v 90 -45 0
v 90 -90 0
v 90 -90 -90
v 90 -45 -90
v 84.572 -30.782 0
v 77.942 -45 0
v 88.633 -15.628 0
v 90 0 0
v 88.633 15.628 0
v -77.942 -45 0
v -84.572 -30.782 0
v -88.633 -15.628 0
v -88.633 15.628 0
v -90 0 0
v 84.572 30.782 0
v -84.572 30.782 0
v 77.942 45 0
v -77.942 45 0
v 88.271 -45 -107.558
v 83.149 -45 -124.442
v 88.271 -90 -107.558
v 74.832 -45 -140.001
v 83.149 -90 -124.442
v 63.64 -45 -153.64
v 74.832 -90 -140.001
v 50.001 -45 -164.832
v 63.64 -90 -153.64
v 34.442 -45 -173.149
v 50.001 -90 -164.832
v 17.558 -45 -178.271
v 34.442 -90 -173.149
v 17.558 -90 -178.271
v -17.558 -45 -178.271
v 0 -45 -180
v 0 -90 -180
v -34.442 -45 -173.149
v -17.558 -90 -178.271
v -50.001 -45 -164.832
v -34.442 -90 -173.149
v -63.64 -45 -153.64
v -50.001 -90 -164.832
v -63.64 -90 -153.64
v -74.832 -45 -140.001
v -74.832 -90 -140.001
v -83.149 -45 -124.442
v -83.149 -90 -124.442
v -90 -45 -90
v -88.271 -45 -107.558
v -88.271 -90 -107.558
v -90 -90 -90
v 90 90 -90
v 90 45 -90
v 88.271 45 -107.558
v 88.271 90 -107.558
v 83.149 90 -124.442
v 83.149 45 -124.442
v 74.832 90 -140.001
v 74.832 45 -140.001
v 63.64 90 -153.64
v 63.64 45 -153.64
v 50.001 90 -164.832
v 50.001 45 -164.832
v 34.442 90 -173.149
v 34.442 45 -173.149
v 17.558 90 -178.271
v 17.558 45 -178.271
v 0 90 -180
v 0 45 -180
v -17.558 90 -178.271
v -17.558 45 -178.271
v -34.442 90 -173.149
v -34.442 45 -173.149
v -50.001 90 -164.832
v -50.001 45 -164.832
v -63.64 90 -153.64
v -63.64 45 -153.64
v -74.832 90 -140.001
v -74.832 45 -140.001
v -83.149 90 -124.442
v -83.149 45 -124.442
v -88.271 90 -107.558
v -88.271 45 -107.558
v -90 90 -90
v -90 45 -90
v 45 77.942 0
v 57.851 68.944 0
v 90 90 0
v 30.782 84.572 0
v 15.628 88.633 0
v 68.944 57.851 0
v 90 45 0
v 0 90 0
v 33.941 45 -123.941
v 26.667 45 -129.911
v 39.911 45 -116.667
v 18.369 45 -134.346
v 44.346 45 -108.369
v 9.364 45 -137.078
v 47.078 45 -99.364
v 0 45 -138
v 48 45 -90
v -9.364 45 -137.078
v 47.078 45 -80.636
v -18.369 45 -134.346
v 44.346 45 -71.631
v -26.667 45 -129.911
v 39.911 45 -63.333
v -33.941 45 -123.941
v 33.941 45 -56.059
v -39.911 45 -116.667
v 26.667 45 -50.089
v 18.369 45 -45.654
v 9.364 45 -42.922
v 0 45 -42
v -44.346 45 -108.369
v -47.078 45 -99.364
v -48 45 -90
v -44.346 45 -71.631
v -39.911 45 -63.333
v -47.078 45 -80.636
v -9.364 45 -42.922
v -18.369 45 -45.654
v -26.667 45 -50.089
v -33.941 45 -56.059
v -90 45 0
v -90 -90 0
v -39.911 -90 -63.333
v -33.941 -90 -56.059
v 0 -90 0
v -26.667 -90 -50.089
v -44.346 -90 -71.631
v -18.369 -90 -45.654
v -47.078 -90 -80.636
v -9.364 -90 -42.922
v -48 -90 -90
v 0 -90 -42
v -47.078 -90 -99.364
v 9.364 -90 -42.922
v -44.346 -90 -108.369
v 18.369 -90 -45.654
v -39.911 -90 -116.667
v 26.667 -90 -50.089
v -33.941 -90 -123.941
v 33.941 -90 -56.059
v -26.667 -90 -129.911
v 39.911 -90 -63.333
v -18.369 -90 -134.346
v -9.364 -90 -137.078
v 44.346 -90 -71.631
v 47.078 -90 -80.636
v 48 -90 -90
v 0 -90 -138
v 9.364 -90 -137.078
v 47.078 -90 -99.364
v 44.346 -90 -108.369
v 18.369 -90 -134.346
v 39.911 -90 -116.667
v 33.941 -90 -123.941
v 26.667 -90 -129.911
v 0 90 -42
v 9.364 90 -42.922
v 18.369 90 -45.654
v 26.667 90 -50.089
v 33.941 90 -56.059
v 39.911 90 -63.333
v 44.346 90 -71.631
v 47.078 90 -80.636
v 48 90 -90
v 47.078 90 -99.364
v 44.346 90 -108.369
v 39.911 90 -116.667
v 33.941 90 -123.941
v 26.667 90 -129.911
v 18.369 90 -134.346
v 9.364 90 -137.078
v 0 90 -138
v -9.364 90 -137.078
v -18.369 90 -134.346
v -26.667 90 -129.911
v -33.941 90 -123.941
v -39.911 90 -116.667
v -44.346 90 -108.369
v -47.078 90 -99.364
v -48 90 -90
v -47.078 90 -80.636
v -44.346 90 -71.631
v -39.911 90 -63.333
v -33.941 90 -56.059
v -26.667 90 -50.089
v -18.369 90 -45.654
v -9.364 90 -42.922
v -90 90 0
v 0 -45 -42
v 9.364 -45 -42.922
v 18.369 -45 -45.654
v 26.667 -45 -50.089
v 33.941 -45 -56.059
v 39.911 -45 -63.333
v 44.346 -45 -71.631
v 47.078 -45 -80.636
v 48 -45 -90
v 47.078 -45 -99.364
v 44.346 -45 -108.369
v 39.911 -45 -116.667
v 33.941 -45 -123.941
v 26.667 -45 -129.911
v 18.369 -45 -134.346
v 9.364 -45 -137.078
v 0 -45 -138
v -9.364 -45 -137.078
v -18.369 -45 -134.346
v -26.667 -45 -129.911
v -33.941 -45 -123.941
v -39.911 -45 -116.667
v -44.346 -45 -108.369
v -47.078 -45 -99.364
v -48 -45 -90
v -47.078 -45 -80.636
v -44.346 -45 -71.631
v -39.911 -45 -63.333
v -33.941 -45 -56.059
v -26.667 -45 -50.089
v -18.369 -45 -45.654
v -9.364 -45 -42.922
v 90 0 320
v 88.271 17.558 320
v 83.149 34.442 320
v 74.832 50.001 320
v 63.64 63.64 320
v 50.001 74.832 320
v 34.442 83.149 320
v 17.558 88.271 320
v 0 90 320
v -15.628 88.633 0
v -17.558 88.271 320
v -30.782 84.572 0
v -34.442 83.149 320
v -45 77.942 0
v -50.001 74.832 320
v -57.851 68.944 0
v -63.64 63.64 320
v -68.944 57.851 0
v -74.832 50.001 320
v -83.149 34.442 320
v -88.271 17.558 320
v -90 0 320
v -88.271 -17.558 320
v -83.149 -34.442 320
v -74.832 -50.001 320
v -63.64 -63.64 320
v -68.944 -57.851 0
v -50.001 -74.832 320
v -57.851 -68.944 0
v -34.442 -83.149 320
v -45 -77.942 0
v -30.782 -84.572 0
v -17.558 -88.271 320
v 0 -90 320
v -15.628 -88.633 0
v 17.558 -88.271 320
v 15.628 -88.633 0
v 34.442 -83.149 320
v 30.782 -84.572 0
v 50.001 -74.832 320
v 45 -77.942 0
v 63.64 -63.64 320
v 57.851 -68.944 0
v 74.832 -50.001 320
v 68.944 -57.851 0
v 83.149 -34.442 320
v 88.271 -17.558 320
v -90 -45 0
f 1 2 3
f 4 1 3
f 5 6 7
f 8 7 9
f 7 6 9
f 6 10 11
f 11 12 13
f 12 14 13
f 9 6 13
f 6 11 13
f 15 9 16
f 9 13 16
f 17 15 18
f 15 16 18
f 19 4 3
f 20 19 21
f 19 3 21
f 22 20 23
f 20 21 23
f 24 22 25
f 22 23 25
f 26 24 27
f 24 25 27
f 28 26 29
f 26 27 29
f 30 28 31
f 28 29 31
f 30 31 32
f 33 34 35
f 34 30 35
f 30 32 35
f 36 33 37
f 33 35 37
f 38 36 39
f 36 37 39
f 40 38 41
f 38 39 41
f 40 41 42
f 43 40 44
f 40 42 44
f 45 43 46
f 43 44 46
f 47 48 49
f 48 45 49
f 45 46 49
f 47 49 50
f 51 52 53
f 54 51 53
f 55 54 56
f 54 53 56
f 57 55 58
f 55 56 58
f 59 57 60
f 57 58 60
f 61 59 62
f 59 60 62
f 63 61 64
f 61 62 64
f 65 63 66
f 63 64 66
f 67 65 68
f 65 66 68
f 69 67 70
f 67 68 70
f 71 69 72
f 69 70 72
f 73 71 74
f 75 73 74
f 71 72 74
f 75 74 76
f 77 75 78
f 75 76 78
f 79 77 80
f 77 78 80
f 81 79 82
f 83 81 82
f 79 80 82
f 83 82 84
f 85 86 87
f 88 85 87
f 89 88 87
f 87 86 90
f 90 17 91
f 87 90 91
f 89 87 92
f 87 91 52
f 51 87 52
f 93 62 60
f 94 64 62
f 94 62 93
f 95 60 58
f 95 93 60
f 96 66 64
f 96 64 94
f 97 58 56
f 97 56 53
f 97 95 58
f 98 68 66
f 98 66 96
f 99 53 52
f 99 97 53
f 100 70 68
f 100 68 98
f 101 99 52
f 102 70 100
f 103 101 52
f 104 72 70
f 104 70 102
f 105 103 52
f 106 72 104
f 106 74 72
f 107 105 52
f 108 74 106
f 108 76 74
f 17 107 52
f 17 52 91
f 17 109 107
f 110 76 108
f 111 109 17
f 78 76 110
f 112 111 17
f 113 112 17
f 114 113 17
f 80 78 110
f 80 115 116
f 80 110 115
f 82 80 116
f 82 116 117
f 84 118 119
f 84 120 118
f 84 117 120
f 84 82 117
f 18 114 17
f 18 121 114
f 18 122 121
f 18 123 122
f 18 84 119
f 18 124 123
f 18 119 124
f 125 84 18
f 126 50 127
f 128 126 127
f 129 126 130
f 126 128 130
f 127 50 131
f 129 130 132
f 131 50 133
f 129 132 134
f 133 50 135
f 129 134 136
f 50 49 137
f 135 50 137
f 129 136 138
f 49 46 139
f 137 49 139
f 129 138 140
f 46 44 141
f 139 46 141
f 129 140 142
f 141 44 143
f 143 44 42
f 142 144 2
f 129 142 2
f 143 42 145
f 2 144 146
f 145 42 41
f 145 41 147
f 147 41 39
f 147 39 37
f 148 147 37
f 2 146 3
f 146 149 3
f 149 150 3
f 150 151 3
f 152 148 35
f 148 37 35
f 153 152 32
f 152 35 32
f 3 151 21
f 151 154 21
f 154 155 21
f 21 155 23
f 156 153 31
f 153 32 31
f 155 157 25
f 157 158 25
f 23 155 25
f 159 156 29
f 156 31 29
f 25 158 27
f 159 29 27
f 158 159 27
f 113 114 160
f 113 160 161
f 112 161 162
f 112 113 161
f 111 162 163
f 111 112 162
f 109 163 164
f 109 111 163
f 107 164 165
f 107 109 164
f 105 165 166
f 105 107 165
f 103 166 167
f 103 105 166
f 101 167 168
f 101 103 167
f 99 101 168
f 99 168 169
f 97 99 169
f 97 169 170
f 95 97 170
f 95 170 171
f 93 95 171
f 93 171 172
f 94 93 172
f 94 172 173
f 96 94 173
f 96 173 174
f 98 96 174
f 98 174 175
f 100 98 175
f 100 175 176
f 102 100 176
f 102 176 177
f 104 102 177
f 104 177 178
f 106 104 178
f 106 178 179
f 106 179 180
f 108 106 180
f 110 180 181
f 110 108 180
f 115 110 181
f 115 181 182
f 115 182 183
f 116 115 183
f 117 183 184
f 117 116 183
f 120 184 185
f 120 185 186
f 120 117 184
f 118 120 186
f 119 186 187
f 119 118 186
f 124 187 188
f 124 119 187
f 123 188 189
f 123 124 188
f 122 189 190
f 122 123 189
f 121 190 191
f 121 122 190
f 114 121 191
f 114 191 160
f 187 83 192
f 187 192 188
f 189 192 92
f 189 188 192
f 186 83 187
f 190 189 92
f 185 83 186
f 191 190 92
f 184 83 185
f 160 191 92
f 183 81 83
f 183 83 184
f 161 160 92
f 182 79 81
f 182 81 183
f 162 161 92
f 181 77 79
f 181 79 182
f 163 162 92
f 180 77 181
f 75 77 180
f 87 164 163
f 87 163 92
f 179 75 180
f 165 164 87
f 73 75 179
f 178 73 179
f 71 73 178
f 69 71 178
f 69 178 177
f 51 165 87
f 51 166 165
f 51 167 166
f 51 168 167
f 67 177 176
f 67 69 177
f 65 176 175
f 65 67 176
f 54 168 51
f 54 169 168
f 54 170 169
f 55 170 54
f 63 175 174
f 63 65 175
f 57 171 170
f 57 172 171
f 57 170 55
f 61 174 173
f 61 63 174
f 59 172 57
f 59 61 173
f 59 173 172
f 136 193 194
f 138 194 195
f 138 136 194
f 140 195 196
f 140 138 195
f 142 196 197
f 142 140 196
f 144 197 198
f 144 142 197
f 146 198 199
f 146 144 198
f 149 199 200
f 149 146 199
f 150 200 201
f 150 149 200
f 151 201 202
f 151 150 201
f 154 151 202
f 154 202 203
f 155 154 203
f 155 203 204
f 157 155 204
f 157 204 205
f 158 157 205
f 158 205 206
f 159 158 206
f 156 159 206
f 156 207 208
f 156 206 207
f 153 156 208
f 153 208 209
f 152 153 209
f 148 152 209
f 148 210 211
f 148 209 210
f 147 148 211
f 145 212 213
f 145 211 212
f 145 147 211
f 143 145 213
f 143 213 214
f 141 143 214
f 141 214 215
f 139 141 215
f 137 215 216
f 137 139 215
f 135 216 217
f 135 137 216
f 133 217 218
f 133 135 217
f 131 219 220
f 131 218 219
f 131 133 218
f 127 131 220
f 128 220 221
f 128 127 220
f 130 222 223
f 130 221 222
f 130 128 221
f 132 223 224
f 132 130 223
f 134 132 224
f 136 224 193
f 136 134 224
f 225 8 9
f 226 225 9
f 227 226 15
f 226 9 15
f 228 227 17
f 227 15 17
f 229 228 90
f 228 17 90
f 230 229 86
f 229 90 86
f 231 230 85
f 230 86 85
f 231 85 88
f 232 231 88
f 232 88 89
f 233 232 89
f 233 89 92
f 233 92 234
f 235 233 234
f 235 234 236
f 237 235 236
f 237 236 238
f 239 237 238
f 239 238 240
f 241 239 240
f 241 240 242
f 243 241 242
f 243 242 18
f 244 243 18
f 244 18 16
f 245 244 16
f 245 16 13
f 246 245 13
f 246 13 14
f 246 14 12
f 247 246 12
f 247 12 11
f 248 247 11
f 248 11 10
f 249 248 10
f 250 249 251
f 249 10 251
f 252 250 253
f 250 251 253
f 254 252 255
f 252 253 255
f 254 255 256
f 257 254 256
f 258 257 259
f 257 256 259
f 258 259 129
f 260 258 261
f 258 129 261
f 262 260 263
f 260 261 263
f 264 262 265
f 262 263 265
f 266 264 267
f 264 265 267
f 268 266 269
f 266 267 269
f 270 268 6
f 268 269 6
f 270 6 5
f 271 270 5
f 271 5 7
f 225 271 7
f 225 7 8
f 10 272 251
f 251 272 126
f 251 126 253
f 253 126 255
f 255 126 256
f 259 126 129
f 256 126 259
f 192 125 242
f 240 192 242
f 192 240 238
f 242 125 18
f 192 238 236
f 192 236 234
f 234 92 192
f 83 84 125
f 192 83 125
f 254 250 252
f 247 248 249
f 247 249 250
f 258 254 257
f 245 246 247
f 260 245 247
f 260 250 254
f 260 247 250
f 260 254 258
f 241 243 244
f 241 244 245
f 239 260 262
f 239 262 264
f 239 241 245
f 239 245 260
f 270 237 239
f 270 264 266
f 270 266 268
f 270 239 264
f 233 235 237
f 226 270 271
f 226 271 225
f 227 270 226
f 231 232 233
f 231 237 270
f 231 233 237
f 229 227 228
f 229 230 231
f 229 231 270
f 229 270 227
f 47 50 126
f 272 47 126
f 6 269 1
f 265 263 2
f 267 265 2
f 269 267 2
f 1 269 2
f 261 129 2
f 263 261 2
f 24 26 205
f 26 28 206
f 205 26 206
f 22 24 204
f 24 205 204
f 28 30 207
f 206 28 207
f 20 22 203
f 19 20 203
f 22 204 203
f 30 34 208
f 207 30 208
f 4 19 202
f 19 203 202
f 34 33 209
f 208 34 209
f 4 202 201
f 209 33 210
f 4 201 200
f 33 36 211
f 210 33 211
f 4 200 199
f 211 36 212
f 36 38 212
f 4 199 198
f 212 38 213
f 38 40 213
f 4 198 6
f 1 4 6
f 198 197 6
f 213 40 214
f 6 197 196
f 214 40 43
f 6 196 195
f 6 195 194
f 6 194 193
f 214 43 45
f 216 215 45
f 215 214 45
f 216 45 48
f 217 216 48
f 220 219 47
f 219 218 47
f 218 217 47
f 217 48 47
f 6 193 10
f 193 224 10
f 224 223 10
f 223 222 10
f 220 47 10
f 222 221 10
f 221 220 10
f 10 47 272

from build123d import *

# Parameters (mm, degrees)
SKETCH1_R                = 90
BOSS_EXTRUDE1_DEPTH      = 320
BOSS_EXTRUDE2_DEPTH      = 90
BOSS_EXTRUDE2_DEPTH_BACK = 90
SKETCH2_R                = 48
SKETCH3_W                = 213.4354408
SKETCH3_H                = 90
CUT_EXTRUDE1_DEPTH       = 663


with BuildPart() as part:
    # Sketch1 → Boss-Extrude1 (new body)
    with BuildSketch(Plane.XY):
        Circle(SKETCH1_R)
    extrude(amount=BOSS_EXTRUDE1_DEPTH)

    # Sketch2 → Boss-Extrude2 (add, two sides: drawn at the far end of the back side and taken through both)
    with BuildSketch(Plane(origin=(0, 0, 0), x_dir=(1, 0, 0), z_dir=(0, 1, 0)).offset(-BOSS_EXTRUDE2_DEPTH_BACK)):
        with BuildLine():
            Line((90, 0), (90, 90))
            ThreePointArc((90, 90), (0, 180), (-90, 90))
            Line((-90, 90), (-90, 0))
            Line((-90, 0), (0, 0))
            Line((0, 0), (90, 0))
        make_face()
        with Locations((0, 90)):
            Circle(SKETCH2_R, mode=Mode.SUBTRACT)
    extrude(amount=BOSS_EXTRUDE2_DEPTH + BOSS_EXTRUDE2_DEPTH_BACK)

    # Sketch3 → Cut-Extrude1 (cut)
    with BuildSketch(Plane.ZY.offset(90)):
        with Locations((-106.7177204, 0)):
            Rectangle(SKETCH3_W, SKETCH3_H)
    extrude(amount=-CUT_EXTRUDE1_DEPTH, mode=Mode.SUBTRACT)


solid = part.part
